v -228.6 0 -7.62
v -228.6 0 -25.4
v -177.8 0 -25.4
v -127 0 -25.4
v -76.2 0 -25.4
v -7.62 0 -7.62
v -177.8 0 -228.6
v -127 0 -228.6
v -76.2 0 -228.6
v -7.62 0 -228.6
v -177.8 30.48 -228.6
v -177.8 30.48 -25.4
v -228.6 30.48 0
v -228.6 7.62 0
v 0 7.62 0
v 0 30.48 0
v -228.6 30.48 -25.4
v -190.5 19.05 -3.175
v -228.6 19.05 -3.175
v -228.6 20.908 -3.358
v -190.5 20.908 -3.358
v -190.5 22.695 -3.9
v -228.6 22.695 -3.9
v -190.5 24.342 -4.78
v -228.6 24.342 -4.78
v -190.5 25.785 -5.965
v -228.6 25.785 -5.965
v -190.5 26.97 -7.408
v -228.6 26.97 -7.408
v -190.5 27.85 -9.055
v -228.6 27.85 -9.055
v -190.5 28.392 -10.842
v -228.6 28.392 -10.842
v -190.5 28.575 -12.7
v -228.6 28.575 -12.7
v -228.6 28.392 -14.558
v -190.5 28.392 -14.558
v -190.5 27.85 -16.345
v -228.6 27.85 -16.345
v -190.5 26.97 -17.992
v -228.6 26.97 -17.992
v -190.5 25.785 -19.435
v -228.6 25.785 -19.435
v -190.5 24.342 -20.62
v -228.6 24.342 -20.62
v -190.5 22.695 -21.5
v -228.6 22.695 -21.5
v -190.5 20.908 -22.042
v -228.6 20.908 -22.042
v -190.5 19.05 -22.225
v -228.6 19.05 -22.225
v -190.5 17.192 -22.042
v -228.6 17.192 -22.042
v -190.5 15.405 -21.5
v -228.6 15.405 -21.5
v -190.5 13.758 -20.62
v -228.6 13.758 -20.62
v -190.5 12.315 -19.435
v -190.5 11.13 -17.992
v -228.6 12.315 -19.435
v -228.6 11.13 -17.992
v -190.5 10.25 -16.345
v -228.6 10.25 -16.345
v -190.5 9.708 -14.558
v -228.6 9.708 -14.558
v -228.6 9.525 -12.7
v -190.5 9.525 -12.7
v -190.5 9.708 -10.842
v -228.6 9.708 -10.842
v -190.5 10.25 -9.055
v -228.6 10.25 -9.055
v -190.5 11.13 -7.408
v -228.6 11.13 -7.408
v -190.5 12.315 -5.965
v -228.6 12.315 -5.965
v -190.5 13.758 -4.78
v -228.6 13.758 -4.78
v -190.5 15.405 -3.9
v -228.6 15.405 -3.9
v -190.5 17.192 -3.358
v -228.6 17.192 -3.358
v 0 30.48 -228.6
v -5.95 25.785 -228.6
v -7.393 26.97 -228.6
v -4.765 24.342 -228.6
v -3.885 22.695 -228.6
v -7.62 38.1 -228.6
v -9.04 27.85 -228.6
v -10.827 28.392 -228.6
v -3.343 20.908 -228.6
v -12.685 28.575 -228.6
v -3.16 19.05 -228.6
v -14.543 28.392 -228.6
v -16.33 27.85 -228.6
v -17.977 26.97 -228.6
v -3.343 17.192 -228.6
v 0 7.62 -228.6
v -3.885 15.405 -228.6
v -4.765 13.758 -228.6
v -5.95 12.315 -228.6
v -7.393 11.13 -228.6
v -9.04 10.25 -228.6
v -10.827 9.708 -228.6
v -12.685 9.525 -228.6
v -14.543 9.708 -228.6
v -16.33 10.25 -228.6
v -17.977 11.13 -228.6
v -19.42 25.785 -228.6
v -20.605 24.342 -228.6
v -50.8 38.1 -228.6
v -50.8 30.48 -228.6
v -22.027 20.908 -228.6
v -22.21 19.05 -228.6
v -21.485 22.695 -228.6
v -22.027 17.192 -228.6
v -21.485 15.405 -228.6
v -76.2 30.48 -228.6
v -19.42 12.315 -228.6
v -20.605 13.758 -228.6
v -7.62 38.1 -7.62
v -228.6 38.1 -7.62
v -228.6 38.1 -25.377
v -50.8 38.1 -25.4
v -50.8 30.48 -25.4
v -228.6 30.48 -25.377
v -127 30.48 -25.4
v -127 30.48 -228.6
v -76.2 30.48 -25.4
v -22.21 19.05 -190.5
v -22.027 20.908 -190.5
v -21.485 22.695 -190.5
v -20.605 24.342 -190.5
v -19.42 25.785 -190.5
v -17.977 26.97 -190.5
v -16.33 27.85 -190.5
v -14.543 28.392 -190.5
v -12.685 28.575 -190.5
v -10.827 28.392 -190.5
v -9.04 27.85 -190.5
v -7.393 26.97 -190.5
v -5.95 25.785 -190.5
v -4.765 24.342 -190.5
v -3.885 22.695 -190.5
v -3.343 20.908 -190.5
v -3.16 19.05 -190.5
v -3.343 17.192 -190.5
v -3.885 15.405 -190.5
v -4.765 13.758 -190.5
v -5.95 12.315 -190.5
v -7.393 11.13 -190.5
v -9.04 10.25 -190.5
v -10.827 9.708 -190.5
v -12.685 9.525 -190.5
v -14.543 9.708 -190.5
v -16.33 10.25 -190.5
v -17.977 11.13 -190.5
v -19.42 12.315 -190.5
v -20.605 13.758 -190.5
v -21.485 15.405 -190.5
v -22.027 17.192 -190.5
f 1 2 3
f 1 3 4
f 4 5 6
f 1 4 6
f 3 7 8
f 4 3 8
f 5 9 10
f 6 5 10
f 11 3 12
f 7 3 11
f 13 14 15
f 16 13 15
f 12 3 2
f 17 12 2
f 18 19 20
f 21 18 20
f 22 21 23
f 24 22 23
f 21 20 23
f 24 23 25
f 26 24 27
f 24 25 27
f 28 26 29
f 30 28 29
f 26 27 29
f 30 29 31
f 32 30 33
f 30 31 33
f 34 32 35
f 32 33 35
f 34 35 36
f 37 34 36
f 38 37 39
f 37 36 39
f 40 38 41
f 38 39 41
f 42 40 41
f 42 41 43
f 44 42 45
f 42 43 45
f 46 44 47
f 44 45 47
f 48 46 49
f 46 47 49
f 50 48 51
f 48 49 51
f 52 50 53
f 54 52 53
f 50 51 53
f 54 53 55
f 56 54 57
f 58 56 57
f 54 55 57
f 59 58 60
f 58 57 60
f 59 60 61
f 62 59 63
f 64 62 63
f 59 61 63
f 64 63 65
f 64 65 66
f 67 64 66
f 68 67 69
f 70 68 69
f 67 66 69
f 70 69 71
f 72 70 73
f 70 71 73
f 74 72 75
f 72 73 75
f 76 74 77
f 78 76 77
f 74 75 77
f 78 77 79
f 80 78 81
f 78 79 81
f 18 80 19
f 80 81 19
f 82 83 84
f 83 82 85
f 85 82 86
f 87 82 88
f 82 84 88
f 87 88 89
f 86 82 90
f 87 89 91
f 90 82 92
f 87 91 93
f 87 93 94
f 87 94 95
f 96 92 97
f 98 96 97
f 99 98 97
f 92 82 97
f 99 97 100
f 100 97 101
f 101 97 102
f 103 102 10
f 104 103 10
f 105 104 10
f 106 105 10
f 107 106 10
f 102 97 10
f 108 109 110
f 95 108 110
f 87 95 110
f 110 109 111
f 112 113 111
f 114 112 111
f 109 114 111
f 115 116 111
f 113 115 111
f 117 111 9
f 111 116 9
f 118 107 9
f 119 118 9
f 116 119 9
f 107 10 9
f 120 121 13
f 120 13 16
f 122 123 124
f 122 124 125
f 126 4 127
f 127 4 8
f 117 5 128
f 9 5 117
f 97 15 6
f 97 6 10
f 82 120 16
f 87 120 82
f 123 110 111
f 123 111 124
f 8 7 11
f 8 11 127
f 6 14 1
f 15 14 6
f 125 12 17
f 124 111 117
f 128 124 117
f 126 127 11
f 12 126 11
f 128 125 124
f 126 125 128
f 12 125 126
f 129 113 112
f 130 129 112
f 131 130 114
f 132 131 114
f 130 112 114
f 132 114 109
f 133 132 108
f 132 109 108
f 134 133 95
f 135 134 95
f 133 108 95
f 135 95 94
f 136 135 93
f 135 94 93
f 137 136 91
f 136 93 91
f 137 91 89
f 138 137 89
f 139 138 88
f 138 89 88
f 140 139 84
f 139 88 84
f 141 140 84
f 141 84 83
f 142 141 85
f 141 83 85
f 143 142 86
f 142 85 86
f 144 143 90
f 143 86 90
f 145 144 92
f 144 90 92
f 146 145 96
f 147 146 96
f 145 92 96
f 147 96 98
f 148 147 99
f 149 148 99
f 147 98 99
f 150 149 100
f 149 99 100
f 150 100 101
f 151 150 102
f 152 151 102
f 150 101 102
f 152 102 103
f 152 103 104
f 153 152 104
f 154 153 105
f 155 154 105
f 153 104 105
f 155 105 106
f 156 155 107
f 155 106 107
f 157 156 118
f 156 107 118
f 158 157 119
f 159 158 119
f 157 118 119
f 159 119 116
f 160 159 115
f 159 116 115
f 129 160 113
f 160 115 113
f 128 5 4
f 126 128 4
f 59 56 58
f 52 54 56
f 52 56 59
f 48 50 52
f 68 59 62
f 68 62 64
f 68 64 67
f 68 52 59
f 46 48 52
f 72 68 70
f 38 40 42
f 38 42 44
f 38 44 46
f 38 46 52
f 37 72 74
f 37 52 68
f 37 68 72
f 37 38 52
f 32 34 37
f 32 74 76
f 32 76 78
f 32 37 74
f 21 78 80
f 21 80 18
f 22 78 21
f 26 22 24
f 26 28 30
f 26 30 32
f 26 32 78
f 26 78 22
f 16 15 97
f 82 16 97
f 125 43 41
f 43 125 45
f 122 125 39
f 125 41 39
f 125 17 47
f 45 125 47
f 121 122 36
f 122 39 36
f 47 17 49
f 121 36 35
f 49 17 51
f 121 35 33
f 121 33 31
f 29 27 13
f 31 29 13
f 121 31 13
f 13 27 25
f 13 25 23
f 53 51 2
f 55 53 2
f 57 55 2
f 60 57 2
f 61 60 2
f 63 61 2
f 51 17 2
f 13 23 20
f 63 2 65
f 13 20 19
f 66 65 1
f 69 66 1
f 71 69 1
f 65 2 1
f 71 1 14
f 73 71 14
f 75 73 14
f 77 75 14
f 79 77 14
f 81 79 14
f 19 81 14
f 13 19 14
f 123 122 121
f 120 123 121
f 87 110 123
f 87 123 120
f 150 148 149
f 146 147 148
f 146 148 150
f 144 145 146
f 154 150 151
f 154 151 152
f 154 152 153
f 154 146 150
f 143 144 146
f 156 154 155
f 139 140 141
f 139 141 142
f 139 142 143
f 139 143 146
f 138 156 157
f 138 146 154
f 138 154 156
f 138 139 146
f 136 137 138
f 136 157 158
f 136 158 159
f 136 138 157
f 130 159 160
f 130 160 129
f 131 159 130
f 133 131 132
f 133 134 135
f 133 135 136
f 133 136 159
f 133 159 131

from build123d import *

# Parameters (mm, degrees)
SKETCH1_W           = 50.8
SKETCH1_H           = 203.2
BOSS_EXTRUDE1_DEPTH = 38.1
SKETCH3_R           = 9.525
CUT_EXTRUDE1_DEPTH  = 38.1
SKETCH4_R           = 9.525
CUT_EXTRUDE2_DEPTH  = 38.1
CUT_EXTRUDE3_DEPTH  = 7.62
CHAMFER1_SIZE       = 7.62


with BuildPart() as part:
    # Sketch1 → Boss-Extrude1 (new body)
    with BuildSketch(Plane(origin=(0, 0, 0), x_dir=(1, 0, 0), z_dir=(0, 1, 0))):
        Polygon((-25.4, 228.6), (-25.4, 25.4), (-76.2, 25.4), (-127, 25.4), (-177.8, 25.4), (-228.6, 25.4), (-228.6, 0), (0, 0), (0, 228.6), align=None)
        with Locations((-50.8, 127)):
            Rectangle(SKETCH1_W, SKETCH1_H)
        with Locations((-152.4, 127)):
            Rectangle(SKETCH1_W, SKETCH1_H)
    extrude(amount=BOSS_EXTRUDE1_DEPTH)

    # Sketch3 → Cut-Extrude1 (cut)
    with BuildSketch(Plane.ZY.offset(228.6)):
        with Locations((-12.7, 19.05)):
            Circle(SKETCH3_R)
    extrude(amount=-CUT_EXTRUDE1_DEPTH, mode=Mode.SUBTRACT)

    # Sketch4 → Cut-Extrude2 (cut)
    with BuildSketch(Plane(origin=(0, 0, -228.6), x_dir=(-1, 0, 0), z_dir=(0, 0, -1))):
        with Locations((12.684892179, 19.05)):
            Circle(SKETCH4_R)
    extrude(amount=-CUT_EXTRUDE2_DEPTH, mode=Mode.SUBTRACT)

    # Sketch5 → Cut-Extrude3 (cut)
    with BuildSketch(Plane(origin=(0, 38.1, 0), x_dir=(1, 0, 0), z_dir=(0, 1, 0))):
        Polygon((-50.8, 25.4), (-279.4, 25.371028997), (-279.4, 279.4), (-50.8, 279.4), align=None)
    extrude(amount=-CUT_EXTRUDE3_DEPTH, mode=Mode.SUBTRACT)

    # Chamfer1
    chamfer1_edges = [part.edges().sort_by_distance(p)[0] for p in [
        (0, 0, -114.3),
        (-114.3, 0, 0),
        (-114.3, 38.1, 0),
        (0, 38.1, -114.3),
    ]]
    chamfer(chamfer1_edges, length=CHAMFER1_SIZE)


solid = part.part
